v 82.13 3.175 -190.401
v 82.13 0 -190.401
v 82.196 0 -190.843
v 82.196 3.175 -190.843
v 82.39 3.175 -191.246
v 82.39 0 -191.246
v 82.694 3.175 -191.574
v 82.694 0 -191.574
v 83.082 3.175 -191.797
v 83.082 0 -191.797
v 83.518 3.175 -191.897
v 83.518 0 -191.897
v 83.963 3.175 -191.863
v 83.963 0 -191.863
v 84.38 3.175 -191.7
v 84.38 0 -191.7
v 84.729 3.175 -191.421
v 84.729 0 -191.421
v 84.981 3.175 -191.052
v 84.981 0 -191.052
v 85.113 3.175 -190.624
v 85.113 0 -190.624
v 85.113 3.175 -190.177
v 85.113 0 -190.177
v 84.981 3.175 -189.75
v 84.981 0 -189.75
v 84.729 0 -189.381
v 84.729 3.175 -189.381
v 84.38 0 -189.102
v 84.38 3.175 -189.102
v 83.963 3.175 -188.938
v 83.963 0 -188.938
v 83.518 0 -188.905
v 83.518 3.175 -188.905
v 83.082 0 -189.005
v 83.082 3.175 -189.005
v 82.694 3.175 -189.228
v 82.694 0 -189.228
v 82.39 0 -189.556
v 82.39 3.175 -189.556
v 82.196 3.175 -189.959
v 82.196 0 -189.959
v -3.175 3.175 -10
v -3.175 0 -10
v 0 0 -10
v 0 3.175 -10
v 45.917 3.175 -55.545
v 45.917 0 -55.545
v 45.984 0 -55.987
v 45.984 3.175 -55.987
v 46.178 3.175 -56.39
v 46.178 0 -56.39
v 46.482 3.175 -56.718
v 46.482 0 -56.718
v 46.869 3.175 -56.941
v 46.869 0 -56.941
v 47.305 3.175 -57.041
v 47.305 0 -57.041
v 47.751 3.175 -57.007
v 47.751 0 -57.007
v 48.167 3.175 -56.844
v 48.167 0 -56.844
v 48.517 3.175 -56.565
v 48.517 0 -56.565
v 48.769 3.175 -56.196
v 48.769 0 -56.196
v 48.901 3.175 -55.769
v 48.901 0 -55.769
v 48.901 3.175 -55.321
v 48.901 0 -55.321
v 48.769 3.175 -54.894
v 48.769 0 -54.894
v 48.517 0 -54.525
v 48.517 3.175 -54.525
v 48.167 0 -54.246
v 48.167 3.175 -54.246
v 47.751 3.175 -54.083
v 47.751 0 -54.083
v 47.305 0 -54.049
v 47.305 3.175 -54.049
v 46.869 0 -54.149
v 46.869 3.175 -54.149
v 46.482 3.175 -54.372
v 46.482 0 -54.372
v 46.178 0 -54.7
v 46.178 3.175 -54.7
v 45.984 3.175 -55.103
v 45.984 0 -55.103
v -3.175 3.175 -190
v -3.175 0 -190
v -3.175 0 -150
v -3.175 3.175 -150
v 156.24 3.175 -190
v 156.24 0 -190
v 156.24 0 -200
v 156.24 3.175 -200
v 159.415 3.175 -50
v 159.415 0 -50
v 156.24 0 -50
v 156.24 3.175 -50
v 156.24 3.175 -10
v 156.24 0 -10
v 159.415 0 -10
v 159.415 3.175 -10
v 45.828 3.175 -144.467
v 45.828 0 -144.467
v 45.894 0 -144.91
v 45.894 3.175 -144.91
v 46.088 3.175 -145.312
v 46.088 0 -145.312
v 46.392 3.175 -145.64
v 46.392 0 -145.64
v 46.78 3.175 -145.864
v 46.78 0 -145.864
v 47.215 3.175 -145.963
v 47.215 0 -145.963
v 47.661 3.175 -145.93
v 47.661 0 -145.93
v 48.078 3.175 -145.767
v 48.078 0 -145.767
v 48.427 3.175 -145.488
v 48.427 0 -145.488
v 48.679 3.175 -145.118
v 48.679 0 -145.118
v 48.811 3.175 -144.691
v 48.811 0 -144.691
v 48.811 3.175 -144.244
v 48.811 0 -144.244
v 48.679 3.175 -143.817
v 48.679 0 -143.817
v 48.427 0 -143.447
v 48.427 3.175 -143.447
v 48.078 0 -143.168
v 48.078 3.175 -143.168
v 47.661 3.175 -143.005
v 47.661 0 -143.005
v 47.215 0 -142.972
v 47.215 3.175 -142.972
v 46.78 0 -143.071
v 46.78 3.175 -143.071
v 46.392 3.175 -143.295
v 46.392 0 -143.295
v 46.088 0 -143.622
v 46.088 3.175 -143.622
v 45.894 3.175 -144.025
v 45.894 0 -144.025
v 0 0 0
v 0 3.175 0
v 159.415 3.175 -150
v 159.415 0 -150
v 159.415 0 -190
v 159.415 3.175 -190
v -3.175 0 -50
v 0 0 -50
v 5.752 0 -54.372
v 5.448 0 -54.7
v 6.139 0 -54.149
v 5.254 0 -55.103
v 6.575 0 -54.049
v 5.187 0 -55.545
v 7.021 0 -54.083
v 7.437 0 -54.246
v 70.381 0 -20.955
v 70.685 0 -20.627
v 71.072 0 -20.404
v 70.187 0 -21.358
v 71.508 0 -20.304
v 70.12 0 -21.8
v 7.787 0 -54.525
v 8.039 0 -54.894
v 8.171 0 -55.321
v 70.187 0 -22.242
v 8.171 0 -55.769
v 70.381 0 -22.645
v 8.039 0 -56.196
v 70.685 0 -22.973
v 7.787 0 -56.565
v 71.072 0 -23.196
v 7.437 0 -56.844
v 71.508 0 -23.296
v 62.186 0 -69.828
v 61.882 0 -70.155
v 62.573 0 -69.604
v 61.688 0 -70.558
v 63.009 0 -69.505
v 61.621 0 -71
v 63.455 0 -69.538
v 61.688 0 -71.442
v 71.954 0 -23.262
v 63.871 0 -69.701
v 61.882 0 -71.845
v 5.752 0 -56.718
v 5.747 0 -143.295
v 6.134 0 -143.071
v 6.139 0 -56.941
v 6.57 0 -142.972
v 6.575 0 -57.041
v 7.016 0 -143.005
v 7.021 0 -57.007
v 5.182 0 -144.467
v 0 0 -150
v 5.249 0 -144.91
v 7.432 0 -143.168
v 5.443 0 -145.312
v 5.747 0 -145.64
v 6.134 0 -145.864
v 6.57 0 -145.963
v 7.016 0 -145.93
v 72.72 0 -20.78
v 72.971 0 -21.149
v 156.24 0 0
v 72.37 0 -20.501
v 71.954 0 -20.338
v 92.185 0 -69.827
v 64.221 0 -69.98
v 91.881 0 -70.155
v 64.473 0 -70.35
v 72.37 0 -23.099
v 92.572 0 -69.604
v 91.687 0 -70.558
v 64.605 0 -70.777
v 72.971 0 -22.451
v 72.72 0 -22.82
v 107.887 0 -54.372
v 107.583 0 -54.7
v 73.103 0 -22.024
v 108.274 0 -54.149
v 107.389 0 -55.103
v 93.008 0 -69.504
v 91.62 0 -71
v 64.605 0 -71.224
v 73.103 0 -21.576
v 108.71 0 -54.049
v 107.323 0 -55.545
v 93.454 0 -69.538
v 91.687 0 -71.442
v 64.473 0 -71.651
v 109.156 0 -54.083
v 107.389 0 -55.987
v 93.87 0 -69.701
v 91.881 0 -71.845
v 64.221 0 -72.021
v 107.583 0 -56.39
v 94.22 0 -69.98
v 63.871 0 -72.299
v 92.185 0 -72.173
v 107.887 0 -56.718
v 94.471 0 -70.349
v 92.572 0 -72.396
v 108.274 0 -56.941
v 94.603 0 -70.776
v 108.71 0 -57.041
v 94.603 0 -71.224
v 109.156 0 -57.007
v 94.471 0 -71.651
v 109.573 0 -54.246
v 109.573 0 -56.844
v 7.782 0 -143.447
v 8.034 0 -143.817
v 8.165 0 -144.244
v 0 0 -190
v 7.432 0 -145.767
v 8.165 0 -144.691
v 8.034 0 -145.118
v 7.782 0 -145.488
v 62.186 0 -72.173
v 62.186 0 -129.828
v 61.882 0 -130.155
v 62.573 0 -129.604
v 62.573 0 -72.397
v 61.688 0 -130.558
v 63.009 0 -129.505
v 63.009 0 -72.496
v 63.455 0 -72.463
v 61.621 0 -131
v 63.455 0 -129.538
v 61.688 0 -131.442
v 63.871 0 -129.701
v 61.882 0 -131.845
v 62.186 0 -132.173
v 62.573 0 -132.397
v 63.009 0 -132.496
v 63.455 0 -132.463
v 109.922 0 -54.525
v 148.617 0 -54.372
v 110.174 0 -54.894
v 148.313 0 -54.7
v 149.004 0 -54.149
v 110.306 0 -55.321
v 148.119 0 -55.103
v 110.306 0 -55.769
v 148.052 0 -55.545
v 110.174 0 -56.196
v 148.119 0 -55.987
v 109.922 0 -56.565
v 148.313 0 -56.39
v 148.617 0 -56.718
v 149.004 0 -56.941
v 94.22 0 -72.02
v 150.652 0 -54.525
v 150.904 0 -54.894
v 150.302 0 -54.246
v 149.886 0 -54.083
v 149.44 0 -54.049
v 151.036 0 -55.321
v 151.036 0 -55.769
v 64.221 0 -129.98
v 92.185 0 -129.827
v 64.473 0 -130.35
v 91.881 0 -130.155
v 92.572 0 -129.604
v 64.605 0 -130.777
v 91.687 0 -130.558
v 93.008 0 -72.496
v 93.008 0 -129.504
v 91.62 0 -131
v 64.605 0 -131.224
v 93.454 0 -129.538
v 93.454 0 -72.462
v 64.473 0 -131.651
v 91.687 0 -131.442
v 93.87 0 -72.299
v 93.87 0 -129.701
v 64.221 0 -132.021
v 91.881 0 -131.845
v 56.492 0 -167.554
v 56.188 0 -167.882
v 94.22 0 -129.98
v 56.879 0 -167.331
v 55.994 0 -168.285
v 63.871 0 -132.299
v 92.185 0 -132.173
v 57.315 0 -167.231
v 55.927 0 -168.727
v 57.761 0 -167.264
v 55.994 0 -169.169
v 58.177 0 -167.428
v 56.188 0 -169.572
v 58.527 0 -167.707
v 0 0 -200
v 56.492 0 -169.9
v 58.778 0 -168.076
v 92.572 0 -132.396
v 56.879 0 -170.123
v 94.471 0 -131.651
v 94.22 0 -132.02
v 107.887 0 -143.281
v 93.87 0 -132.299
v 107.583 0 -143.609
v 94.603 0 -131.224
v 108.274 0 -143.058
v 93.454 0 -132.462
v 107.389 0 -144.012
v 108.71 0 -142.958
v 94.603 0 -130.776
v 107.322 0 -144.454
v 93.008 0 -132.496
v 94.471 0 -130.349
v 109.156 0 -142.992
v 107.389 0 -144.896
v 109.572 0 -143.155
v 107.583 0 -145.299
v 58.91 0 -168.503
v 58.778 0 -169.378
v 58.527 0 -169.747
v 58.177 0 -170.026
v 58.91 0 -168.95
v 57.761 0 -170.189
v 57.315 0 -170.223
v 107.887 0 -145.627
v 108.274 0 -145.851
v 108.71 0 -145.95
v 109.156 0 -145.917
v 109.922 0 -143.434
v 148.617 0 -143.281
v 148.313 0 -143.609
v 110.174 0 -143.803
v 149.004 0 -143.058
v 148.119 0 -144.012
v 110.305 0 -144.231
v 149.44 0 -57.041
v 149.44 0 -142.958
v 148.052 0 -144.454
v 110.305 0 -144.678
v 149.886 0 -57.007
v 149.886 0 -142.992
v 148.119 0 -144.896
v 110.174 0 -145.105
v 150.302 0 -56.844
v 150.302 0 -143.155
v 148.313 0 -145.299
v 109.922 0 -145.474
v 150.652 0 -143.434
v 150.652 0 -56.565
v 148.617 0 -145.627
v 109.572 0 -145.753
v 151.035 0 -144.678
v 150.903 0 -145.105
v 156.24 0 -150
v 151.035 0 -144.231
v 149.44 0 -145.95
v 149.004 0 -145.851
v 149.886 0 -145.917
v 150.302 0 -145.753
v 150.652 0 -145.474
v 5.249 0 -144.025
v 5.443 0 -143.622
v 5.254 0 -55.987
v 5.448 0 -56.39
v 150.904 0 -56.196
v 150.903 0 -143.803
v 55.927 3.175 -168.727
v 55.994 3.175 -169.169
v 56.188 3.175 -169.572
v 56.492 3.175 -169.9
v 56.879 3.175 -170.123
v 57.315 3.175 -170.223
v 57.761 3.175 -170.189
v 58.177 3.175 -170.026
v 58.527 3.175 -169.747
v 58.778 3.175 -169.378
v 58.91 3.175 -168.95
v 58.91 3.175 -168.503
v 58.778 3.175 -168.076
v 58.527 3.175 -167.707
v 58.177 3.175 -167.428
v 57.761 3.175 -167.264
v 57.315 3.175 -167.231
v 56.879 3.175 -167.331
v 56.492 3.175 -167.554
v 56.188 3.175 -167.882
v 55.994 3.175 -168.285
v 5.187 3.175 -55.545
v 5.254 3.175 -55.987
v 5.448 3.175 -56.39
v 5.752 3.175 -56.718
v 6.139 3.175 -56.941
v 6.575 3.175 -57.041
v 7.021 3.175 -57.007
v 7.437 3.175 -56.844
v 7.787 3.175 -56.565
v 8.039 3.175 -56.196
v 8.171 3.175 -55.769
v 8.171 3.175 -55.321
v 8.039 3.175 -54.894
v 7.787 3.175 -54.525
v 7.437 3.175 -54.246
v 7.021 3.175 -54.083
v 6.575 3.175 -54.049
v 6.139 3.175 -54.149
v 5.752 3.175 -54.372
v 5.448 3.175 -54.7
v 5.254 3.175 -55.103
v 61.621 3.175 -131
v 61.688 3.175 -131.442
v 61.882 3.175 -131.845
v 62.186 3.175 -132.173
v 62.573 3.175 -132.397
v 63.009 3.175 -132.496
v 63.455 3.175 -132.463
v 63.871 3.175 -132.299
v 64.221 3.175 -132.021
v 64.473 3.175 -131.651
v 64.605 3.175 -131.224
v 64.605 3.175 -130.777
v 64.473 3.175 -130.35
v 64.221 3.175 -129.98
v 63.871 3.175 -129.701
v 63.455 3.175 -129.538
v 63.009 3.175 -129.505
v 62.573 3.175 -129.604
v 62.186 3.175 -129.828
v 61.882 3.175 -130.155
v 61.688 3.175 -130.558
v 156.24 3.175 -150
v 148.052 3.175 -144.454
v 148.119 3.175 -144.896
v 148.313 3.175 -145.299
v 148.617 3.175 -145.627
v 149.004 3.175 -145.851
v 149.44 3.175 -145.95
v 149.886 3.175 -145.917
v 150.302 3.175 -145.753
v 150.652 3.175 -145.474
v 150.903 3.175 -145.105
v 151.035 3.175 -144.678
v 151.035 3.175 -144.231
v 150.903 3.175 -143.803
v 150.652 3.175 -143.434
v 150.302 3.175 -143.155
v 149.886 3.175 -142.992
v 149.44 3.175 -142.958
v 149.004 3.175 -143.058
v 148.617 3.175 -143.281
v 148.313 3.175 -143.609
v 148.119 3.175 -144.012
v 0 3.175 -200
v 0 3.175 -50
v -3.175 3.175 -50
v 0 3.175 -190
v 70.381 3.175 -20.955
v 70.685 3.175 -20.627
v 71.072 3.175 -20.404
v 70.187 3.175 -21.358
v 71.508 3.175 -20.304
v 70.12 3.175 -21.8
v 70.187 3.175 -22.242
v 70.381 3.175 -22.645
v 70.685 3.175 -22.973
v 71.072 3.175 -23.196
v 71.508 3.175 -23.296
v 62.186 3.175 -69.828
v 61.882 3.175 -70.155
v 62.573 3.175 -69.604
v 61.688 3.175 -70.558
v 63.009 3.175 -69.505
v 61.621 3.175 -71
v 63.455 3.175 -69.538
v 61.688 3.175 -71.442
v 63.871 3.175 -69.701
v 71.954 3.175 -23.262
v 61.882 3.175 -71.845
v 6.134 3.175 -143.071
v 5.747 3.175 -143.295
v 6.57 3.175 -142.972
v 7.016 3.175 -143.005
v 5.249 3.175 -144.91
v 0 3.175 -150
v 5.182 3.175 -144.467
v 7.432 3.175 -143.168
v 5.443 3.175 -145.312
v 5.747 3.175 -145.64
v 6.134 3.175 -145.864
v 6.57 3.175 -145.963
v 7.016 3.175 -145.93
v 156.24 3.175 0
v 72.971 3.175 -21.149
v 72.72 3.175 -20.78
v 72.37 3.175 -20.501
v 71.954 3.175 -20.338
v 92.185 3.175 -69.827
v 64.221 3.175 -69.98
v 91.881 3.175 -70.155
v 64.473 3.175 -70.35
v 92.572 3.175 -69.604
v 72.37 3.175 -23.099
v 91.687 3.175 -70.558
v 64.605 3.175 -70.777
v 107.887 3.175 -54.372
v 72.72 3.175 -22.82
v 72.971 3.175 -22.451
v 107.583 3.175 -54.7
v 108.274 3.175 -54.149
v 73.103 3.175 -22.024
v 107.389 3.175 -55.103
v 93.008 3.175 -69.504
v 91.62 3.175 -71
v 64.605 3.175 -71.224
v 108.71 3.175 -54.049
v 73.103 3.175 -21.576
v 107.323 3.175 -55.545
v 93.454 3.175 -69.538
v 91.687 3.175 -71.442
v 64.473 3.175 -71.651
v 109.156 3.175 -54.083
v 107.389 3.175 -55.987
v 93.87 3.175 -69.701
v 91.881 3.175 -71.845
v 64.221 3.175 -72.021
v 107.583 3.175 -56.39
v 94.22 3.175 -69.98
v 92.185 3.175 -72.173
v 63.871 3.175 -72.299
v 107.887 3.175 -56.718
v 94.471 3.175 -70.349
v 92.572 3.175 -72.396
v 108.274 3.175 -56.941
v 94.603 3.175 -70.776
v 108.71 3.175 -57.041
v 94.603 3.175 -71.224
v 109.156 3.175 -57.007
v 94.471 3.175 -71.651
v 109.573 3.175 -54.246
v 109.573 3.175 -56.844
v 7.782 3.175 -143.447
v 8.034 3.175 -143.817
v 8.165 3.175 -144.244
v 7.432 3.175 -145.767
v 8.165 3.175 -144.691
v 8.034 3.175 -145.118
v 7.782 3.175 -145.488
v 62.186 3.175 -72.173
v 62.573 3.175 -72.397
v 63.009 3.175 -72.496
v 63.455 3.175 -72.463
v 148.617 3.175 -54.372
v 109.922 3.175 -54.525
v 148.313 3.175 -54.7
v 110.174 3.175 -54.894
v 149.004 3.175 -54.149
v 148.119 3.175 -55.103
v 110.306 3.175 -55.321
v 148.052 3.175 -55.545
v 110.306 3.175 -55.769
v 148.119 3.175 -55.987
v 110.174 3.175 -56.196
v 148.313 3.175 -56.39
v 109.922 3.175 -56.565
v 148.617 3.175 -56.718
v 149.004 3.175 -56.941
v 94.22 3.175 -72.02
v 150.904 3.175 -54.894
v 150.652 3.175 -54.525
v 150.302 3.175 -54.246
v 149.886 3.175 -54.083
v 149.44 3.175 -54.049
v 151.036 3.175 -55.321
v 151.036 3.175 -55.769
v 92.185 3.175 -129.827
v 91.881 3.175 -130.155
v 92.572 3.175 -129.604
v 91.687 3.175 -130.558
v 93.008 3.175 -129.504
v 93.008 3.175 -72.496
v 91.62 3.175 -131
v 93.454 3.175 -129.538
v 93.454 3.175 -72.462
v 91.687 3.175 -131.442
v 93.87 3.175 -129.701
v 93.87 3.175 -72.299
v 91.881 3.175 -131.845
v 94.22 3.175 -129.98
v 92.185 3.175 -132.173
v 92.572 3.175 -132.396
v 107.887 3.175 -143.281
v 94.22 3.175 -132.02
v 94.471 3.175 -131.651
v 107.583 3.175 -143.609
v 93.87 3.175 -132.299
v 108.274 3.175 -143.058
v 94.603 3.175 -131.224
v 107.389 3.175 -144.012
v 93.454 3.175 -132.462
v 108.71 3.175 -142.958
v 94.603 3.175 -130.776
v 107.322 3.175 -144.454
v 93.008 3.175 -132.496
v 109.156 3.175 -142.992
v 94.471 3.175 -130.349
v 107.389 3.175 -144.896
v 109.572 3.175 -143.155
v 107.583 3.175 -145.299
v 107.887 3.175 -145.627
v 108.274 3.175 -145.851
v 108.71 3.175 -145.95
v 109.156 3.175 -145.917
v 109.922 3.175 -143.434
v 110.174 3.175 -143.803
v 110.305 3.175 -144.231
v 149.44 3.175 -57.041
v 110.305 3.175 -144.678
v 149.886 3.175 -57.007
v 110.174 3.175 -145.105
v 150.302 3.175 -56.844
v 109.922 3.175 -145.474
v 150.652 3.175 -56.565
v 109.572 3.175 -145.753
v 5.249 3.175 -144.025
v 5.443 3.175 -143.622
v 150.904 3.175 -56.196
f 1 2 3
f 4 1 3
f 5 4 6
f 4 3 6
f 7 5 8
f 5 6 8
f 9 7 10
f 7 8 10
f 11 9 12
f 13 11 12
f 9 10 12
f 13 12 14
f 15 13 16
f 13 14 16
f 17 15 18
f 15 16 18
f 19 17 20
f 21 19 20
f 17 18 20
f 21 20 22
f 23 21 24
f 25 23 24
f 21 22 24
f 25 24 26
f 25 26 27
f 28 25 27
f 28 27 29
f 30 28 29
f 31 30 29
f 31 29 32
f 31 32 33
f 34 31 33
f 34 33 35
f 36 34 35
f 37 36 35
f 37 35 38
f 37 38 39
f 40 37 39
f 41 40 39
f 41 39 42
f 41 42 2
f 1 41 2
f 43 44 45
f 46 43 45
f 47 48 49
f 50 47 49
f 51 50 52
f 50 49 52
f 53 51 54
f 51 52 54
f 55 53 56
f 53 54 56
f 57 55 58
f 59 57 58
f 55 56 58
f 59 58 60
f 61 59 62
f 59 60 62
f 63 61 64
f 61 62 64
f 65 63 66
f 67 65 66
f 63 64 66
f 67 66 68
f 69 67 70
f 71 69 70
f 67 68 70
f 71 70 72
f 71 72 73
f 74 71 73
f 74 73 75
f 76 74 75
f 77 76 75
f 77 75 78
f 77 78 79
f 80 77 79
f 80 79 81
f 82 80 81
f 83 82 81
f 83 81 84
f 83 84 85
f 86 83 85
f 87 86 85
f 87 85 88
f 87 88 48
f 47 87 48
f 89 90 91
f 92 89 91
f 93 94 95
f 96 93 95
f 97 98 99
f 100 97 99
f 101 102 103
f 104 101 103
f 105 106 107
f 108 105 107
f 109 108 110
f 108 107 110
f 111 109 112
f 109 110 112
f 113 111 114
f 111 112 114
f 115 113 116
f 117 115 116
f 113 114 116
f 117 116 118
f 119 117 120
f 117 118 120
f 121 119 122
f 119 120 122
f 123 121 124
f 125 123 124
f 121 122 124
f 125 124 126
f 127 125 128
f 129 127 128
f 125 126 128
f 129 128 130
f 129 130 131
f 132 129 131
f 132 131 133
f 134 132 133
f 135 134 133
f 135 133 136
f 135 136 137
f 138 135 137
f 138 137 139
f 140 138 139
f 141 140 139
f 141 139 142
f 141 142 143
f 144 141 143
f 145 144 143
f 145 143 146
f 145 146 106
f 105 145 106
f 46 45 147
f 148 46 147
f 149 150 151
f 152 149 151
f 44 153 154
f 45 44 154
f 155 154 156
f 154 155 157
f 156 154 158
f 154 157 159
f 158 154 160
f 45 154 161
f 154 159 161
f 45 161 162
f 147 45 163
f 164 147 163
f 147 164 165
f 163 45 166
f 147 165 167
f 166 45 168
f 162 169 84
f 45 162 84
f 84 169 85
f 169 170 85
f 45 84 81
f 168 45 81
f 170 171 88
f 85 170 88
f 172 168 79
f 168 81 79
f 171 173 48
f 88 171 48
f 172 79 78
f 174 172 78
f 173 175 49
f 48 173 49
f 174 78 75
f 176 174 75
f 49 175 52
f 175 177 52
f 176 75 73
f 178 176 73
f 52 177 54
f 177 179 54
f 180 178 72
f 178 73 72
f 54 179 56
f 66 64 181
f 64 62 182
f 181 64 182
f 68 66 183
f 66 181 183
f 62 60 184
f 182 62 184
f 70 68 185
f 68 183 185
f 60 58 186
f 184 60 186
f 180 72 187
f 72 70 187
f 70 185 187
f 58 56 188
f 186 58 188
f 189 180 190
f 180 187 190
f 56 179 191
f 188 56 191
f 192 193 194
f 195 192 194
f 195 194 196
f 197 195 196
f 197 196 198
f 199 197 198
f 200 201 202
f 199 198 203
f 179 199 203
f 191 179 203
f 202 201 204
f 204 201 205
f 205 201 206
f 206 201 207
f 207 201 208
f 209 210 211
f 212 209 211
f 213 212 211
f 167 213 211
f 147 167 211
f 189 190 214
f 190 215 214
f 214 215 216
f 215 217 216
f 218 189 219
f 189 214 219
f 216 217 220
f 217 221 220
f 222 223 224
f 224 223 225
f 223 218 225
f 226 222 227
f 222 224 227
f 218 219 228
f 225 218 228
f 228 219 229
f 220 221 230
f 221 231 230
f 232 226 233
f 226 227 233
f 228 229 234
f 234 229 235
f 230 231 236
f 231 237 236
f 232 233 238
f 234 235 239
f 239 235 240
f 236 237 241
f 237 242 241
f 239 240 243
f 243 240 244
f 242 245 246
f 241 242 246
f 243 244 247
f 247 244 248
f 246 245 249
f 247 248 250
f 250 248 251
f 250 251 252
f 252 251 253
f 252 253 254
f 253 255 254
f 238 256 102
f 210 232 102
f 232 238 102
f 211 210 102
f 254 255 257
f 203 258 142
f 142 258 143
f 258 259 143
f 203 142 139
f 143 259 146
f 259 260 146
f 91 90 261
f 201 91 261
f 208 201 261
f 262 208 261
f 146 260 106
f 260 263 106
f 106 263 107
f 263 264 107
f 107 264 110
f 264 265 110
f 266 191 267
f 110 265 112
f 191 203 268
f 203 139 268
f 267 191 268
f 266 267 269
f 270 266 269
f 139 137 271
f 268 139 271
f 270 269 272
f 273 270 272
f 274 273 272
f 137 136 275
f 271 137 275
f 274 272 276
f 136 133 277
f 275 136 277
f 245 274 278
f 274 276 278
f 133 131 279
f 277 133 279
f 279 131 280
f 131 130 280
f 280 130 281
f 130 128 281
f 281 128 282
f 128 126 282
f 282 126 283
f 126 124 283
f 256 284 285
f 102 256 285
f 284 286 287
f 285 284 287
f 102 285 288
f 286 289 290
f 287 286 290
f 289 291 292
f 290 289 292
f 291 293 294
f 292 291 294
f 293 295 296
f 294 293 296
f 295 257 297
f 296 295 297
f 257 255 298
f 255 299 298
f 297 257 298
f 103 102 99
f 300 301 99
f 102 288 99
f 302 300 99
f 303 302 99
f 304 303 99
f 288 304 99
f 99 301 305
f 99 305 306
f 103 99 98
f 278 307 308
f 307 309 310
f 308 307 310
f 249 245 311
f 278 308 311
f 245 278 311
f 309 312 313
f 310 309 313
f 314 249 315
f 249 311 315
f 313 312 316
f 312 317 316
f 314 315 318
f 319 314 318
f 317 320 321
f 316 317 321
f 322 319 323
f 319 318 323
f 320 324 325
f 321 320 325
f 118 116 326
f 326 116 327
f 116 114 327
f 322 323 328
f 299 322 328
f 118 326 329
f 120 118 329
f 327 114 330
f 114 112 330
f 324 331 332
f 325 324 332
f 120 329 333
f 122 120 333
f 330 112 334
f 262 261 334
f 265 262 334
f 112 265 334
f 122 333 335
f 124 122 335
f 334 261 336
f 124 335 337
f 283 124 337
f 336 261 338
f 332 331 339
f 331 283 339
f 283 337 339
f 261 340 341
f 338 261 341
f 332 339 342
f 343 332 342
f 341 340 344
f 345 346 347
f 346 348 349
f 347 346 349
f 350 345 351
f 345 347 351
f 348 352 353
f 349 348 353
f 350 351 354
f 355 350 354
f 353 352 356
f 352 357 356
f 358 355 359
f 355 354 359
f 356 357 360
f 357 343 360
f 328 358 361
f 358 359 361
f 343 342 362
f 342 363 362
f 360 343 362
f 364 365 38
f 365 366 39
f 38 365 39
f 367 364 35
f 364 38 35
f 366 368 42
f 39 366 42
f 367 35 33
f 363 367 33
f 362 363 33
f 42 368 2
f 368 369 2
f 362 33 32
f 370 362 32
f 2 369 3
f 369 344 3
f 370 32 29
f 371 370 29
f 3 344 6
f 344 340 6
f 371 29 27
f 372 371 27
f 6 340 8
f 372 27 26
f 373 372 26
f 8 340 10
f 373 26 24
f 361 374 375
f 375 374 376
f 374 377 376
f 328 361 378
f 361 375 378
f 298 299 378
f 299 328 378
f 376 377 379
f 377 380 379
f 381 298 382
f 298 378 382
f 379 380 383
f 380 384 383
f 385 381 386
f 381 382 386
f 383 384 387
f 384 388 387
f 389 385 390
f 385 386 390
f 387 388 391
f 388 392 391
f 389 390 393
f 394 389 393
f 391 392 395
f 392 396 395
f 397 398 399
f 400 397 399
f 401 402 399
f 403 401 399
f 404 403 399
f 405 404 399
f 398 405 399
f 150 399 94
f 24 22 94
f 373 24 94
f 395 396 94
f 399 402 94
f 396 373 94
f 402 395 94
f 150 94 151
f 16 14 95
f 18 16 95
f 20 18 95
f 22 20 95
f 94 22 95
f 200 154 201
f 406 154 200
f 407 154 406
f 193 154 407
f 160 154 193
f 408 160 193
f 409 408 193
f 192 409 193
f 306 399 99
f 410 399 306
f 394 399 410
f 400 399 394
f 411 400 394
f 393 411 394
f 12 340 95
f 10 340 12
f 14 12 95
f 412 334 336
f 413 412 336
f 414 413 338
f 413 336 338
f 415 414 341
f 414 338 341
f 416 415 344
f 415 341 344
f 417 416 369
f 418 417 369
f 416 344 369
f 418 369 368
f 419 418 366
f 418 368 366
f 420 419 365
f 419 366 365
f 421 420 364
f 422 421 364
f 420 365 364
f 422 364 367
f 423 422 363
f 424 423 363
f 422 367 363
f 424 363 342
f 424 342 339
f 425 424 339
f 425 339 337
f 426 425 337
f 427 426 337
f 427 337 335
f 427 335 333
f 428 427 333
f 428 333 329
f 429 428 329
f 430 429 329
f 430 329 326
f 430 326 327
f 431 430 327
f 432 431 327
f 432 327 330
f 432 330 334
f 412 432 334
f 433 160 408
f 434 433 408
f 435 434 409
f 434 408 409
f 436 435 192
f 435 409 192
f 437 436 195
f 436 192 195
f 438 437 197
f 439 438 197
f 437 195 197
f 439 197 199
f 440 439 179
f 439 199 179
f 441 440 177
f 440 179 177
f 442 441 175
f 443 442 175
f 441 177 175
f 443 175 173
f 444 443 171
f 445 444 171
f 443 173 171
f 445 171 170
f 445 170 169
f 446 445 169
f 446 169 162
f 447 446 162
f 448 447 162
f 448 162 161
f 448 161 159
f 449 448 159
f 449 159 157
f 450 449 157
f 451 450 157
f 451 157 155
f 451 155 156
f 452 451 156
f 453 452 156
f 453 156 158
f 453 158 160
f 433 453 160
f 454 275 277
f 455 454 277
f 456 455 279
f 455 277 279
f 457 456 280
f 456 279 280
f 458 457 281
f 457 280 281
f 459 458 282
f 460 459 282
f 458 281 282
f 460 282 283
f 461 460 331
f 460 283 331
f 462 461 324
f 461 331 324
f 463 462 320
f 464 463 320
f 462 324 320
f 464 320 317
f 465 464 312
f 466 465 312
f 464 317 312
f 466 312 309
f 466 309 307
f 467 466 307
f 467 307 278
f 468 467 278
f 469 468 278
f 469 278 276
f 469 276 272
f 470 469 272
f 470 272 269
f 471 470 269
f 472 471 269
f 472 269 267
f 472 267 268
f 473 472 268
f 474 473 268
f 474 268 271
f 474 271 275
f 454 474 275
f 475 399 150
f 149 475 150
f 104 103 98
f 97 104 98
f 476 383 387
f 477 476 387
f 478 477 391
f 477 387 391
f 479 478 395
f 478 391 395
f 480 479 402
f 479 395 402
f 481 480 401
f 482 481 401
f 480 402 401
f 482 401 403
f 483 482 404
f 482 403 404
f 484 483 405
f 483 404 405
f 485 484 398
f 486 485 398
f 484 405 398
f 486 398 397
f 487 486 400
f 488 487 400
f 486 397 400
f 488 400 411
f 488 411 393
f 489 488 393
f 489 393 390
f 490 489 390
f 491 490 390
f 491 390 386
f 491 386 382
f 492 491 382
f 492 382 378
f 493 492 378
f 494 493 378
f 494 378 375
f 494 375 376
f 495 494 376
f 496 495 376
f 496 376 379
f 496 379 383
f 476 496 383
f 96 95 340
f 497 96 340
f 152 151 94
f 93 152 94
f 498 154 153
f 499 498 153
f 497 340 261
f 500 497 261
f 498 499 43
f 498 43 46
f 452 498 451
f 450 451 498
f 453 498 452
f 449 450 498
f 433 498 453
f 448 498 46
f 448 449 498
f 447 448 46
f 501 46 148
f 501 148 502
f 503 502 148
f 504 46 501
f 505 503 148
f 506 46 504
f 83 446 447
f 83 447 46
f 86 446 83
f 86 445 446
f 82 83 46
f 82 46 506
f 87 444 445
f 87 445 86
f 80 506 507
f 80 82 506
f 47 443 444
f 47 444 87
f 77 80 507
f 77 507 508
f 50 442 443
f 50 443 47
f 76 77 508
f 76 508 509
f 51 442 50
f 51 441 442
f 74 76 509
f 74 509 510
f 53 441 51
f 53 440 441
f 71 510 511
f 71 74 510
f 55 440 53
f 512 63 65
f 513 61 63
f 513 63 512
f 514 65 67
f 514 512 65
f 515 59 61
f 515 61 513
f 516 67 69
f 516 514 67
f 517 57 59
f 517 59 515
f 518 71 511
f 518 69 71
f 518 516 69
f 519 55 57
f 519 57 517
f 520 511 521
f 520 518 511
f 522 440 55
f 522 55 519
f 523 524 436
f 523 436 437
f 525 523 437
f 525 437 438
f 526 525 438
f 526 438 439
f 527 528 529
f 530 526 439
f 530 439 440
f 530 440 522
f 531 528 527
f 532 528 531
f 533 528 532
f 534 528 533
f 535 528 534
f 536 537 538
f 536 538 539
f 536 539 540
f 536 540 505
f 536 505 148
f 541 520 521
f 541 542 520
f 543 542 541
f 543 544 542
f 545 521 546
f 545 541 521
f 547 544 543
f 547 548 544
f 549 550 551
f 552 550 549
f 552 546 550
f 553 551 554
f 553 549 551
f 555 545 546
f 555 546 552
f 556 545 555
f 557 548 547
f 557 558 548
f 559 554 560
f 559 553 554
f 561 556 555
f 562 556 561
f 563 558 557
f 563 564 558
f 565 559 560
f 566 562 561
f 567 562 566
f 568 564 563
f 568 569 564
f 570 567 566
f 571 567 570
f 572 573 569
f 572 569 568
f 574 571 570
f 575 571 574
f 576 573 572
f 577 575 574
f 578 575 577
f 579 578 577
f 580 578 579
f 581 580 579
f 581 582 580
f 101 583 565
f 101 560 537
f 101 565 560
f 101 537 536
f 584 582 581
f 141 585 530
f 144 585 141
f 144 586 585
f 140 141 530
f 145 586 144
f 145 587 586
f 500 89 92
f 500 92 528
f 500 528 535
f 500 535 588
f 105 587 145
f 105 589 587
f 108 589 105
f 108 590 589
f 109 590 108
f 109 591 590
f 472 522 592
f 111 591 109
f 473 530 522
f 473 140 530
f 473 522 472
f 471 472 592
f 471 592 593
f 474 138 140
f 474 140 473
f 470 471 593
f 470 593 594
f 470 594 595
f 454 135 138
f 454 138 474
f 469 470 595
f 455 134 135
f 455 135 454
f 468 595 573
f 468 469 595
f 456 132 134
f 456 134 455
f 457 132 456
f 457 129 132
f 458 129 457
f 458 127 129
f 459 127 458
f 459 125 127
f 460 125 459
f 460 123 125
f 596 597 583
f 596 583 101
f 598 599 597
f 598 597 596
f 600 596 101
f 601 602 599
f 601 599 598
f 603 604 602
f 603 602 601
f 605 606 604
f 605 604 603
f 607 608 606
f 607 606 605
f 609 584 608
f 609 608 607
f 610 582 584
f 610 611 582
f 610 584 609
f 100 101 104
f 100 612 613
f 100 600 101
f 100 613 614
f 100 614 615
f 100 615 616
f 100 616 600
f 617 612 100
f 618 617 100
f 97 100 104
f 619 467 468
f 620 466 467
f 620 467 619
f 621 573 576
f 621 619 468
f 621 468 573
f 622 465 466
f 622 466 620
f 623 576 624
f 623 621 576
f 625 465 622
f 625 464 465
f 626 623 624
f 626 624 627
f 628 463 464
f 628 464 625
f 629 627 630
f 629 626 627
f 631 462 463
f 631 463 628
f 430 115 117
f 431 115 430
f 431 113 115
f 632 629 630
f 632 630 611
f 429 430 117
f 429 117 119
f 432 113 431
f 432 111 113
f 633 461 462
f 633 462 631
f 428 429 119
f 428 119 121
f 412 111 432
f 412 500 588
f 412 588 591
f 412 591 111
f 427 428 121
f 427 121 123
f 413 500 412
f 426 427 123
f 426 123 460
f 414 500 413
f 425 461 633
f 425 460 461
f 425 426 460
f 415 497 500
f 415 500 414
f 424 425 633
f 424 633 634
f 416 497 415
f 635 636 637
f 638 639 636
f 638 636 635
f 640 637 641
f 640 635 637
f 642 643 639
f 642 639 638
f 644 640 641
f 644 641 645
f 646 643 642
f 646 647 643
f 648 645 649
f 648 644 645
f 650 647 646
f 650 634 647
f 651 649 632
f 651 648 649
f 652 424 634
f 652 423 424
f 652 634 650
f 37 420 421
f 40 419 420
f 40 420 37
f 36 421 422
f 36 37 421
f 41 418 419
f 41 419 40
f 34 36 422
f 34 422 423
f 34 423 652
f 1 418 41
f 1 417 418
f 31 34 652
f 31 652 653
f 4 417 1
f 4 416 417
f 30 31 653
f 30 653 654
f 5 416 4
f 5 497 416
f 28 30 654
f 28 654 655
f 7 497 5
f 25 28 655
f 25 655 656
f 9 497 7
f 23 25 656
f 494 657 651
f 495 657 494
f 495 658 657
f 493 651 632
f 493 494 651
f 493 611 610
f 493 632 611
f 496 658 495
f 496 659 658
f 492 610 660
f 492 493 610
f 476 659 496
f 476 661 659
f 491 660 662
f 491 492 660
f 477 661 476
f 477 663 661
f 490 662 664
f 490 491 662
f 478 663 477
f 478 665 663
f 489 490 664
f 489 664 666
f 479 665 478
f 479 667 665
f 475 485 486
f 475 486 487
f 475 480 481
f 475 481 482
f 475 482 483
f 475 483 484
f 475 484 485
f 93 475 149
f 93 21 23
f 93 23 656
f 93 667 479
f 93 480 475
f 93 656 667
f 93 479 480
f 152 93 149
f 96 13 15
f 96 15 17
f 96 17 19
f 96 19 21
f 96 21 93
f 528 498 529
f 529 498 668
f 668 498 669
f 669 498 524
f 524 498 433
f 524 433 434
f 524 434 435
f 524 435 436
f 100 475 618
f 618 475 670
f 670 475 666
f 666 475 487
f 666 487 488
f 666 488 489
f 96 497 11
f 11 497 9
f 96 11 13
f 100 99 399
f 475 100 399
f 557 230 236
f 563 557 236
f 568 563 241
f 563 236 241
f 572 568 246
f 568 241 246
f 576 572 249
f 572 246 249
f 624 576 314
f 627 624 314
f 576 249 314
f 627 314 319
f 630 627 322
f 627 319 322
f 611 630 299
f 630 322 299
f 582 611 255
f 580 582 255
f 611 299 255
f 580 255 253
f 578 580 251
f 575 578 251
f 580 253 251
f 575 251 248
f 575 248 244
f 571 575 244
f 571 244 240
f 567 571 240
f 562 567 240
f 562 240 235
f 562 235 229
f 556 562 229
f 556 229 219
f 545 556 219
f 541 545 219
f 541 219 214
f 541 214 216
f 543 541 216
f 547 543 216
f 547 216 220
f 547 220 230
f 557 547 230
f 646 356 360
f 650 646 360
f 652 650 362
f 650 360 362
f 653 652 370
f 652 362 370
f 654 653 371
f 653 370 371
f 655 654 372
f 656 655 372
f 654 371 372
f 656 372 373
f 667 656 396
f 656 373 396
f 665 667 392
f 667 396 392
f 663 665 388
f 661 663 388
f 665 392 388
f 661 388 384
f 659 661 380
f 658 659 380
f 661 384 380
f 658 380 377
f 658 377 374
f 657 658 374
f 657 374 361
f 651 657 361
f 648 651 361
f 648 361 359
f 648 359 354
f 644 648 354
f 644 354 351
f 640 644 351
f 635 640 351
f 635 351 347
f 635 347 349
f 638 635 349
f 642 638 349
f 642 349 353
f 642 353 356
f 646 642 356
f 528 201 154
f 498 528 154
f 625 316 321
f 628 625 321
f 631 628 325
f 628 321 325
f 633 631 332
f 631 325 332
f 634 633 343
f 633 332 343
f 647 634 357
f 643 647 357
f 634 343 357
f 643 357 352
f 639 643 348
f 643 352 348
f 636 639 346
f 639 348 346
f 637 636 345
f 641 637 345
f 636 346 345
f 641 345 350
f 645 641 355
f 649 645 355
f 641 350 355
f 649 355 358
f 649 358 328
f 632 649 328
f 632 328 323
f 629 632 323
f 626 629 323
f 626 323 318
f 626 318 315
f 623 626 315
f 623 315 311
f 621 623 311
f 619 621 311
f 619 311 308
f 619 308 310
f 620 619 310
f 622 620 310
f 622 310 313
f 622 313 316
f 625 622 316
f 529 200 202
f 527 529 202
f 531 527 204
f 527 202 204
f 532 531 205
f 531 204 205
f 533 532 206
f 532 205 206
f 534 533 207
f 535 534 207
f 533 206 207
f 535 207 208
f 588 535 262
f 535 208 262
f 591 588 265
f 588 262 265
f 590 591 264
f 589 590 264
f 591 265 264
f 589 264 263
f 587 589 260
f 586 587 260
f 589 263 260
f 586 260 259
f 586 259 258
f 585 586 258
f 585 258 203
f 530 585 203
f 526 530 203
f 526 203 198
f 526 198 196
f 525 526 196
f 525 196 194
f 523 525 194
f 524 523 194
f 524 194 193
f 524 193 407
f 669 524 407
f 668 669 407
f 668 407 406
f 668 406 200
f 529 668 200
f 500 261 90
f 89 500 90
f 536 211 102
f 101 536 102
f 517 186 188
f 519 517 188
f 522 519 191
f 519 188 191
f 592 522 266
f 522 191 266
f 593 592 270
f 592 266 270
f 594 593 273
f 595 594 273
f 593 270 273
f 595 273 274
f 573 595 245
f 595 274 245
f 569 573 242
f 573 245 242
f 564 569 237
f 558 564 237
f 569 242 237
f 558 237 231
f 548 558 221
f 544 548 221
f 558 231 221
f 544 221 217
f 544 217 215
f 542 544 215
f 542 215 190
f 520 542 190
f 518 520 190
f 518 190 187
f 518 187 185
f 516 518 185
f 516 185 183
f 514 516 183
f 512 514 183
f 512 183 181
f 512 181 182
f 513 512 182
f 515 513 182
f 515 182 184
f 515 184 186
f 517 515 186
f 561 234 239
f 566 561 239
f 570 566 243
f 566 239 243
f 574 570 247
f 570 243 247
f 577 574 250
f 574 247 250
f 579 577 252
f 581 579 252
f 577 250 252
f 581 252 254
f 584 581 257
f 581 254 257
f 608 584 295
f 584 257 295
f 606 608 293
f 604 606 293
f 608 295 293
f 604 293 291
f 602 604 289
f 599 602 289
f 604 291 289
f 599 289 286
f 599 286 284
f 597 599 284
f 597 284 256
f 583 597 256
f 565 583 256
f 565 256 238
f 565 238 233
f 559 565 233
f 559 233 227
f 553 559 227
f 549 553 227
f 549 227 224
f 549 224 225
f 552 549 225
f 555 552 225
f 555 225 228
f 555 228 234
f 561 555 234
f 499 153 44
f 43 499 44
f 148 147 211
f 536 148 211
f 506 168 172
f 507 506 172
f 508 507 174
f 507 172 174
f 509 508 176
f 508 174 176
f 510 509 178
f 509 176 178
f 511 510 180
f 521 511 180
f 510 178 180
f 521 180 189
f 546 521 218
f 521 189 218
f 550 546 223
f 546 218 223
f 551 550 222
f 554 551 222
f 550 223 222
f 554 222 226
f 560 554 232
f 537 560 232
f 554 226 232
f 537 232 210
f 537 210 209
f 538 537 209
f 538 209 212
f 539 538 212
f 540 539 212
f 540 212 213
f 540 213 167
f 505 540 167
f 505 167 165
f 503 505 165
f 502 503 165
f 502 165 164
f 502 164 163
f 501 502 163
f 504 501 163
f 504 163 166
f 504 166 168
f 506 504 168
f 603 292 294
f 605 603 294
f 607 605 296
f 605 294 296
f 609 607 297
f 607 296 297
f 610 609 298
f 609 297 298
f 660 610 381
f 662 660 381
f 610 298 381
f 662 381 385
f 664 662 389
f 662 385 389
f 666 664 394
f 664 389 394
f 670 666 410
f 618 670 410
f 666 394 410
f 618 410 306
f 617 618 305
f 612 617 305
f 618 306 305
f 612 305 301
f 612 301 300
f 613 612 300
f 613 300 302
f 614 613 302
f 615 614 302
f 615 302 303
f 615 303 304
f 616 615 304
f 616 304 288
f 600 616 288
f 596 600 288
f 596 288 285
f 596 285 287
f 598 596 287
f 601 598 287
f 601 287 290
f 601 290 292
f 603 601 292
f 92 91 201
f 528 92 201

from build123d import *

# Parameters (mm, degrees)
BOSS_EXTRUDE1_DEPTH      = 3.175
F_1_0_1_DIAMETER_HOLE1_D = 3
F_3_0_3_DIAMETER_HOLE1_D = 3


with BuildPart() as part:
    # Sketch1 → Boss-Extrude1 (new body)
    with BuildSketch(Plane(origin=(0, 0, 0), x_dir=(1, 0, 0), z_dir=(0, 1, 0))):
        Polygon((0, 190), (-3.175, 190), (-3.175, 150), (0, 150), (0, 50), (-3.175, 50), (-3.175, 10), (0, 10), (0, 0), (156.24, 0), (156.24, 10), (159.415, 10), (159.415, 50), (156.24, 50), (156.24, 150), (159.415, 150), (159.415, 190), (156.24, 190), (156.24, 200), (0, 200), align=None)
    extrude(amount=BOSS_EXTRUDE1_DEPTH)

    # Ø1.0 (1) Diameter Hole1 (through all)
    with Locations(Plane(origin=(0, 3.175, 0), x_dir=(1, 0, 0), z_dir=(0, 1, 0))):
        with Locations((47.327548064, 144.467472705), (6.682102799, 144.467472705), (57.426953427, 168.726839726), (83.629599498, 190.400856446), (108.822249068, 144.454220349), (149.551998107, 144.454220349), (47.417498943, 55.54499618), (108.822508358, 55.54499618), (149.552467088, 55.54499618), (71.619997678, 21.799999041), (6.6874813, 55.54499618)):
            Hole(F_1_0_1_DIAMETER_HOLE1_D / 2)

    # Ø3.0 (3) Diameter Hole1 (through all)
    with Locations(Plane(origin=(0, 3.175, 0), x_dir=(1, 0, 0), z_dir=(0, 1, 0))):
        with Locations((63.121282677, 131.000354826), (93.119995544, 130.999996355), (63.121282677, 71.000354826), (93.119995544, 70.999996355)):
            Hole(F_3_0_3_DIAMETER_HOLE1_D / 2)


solid = part.part
